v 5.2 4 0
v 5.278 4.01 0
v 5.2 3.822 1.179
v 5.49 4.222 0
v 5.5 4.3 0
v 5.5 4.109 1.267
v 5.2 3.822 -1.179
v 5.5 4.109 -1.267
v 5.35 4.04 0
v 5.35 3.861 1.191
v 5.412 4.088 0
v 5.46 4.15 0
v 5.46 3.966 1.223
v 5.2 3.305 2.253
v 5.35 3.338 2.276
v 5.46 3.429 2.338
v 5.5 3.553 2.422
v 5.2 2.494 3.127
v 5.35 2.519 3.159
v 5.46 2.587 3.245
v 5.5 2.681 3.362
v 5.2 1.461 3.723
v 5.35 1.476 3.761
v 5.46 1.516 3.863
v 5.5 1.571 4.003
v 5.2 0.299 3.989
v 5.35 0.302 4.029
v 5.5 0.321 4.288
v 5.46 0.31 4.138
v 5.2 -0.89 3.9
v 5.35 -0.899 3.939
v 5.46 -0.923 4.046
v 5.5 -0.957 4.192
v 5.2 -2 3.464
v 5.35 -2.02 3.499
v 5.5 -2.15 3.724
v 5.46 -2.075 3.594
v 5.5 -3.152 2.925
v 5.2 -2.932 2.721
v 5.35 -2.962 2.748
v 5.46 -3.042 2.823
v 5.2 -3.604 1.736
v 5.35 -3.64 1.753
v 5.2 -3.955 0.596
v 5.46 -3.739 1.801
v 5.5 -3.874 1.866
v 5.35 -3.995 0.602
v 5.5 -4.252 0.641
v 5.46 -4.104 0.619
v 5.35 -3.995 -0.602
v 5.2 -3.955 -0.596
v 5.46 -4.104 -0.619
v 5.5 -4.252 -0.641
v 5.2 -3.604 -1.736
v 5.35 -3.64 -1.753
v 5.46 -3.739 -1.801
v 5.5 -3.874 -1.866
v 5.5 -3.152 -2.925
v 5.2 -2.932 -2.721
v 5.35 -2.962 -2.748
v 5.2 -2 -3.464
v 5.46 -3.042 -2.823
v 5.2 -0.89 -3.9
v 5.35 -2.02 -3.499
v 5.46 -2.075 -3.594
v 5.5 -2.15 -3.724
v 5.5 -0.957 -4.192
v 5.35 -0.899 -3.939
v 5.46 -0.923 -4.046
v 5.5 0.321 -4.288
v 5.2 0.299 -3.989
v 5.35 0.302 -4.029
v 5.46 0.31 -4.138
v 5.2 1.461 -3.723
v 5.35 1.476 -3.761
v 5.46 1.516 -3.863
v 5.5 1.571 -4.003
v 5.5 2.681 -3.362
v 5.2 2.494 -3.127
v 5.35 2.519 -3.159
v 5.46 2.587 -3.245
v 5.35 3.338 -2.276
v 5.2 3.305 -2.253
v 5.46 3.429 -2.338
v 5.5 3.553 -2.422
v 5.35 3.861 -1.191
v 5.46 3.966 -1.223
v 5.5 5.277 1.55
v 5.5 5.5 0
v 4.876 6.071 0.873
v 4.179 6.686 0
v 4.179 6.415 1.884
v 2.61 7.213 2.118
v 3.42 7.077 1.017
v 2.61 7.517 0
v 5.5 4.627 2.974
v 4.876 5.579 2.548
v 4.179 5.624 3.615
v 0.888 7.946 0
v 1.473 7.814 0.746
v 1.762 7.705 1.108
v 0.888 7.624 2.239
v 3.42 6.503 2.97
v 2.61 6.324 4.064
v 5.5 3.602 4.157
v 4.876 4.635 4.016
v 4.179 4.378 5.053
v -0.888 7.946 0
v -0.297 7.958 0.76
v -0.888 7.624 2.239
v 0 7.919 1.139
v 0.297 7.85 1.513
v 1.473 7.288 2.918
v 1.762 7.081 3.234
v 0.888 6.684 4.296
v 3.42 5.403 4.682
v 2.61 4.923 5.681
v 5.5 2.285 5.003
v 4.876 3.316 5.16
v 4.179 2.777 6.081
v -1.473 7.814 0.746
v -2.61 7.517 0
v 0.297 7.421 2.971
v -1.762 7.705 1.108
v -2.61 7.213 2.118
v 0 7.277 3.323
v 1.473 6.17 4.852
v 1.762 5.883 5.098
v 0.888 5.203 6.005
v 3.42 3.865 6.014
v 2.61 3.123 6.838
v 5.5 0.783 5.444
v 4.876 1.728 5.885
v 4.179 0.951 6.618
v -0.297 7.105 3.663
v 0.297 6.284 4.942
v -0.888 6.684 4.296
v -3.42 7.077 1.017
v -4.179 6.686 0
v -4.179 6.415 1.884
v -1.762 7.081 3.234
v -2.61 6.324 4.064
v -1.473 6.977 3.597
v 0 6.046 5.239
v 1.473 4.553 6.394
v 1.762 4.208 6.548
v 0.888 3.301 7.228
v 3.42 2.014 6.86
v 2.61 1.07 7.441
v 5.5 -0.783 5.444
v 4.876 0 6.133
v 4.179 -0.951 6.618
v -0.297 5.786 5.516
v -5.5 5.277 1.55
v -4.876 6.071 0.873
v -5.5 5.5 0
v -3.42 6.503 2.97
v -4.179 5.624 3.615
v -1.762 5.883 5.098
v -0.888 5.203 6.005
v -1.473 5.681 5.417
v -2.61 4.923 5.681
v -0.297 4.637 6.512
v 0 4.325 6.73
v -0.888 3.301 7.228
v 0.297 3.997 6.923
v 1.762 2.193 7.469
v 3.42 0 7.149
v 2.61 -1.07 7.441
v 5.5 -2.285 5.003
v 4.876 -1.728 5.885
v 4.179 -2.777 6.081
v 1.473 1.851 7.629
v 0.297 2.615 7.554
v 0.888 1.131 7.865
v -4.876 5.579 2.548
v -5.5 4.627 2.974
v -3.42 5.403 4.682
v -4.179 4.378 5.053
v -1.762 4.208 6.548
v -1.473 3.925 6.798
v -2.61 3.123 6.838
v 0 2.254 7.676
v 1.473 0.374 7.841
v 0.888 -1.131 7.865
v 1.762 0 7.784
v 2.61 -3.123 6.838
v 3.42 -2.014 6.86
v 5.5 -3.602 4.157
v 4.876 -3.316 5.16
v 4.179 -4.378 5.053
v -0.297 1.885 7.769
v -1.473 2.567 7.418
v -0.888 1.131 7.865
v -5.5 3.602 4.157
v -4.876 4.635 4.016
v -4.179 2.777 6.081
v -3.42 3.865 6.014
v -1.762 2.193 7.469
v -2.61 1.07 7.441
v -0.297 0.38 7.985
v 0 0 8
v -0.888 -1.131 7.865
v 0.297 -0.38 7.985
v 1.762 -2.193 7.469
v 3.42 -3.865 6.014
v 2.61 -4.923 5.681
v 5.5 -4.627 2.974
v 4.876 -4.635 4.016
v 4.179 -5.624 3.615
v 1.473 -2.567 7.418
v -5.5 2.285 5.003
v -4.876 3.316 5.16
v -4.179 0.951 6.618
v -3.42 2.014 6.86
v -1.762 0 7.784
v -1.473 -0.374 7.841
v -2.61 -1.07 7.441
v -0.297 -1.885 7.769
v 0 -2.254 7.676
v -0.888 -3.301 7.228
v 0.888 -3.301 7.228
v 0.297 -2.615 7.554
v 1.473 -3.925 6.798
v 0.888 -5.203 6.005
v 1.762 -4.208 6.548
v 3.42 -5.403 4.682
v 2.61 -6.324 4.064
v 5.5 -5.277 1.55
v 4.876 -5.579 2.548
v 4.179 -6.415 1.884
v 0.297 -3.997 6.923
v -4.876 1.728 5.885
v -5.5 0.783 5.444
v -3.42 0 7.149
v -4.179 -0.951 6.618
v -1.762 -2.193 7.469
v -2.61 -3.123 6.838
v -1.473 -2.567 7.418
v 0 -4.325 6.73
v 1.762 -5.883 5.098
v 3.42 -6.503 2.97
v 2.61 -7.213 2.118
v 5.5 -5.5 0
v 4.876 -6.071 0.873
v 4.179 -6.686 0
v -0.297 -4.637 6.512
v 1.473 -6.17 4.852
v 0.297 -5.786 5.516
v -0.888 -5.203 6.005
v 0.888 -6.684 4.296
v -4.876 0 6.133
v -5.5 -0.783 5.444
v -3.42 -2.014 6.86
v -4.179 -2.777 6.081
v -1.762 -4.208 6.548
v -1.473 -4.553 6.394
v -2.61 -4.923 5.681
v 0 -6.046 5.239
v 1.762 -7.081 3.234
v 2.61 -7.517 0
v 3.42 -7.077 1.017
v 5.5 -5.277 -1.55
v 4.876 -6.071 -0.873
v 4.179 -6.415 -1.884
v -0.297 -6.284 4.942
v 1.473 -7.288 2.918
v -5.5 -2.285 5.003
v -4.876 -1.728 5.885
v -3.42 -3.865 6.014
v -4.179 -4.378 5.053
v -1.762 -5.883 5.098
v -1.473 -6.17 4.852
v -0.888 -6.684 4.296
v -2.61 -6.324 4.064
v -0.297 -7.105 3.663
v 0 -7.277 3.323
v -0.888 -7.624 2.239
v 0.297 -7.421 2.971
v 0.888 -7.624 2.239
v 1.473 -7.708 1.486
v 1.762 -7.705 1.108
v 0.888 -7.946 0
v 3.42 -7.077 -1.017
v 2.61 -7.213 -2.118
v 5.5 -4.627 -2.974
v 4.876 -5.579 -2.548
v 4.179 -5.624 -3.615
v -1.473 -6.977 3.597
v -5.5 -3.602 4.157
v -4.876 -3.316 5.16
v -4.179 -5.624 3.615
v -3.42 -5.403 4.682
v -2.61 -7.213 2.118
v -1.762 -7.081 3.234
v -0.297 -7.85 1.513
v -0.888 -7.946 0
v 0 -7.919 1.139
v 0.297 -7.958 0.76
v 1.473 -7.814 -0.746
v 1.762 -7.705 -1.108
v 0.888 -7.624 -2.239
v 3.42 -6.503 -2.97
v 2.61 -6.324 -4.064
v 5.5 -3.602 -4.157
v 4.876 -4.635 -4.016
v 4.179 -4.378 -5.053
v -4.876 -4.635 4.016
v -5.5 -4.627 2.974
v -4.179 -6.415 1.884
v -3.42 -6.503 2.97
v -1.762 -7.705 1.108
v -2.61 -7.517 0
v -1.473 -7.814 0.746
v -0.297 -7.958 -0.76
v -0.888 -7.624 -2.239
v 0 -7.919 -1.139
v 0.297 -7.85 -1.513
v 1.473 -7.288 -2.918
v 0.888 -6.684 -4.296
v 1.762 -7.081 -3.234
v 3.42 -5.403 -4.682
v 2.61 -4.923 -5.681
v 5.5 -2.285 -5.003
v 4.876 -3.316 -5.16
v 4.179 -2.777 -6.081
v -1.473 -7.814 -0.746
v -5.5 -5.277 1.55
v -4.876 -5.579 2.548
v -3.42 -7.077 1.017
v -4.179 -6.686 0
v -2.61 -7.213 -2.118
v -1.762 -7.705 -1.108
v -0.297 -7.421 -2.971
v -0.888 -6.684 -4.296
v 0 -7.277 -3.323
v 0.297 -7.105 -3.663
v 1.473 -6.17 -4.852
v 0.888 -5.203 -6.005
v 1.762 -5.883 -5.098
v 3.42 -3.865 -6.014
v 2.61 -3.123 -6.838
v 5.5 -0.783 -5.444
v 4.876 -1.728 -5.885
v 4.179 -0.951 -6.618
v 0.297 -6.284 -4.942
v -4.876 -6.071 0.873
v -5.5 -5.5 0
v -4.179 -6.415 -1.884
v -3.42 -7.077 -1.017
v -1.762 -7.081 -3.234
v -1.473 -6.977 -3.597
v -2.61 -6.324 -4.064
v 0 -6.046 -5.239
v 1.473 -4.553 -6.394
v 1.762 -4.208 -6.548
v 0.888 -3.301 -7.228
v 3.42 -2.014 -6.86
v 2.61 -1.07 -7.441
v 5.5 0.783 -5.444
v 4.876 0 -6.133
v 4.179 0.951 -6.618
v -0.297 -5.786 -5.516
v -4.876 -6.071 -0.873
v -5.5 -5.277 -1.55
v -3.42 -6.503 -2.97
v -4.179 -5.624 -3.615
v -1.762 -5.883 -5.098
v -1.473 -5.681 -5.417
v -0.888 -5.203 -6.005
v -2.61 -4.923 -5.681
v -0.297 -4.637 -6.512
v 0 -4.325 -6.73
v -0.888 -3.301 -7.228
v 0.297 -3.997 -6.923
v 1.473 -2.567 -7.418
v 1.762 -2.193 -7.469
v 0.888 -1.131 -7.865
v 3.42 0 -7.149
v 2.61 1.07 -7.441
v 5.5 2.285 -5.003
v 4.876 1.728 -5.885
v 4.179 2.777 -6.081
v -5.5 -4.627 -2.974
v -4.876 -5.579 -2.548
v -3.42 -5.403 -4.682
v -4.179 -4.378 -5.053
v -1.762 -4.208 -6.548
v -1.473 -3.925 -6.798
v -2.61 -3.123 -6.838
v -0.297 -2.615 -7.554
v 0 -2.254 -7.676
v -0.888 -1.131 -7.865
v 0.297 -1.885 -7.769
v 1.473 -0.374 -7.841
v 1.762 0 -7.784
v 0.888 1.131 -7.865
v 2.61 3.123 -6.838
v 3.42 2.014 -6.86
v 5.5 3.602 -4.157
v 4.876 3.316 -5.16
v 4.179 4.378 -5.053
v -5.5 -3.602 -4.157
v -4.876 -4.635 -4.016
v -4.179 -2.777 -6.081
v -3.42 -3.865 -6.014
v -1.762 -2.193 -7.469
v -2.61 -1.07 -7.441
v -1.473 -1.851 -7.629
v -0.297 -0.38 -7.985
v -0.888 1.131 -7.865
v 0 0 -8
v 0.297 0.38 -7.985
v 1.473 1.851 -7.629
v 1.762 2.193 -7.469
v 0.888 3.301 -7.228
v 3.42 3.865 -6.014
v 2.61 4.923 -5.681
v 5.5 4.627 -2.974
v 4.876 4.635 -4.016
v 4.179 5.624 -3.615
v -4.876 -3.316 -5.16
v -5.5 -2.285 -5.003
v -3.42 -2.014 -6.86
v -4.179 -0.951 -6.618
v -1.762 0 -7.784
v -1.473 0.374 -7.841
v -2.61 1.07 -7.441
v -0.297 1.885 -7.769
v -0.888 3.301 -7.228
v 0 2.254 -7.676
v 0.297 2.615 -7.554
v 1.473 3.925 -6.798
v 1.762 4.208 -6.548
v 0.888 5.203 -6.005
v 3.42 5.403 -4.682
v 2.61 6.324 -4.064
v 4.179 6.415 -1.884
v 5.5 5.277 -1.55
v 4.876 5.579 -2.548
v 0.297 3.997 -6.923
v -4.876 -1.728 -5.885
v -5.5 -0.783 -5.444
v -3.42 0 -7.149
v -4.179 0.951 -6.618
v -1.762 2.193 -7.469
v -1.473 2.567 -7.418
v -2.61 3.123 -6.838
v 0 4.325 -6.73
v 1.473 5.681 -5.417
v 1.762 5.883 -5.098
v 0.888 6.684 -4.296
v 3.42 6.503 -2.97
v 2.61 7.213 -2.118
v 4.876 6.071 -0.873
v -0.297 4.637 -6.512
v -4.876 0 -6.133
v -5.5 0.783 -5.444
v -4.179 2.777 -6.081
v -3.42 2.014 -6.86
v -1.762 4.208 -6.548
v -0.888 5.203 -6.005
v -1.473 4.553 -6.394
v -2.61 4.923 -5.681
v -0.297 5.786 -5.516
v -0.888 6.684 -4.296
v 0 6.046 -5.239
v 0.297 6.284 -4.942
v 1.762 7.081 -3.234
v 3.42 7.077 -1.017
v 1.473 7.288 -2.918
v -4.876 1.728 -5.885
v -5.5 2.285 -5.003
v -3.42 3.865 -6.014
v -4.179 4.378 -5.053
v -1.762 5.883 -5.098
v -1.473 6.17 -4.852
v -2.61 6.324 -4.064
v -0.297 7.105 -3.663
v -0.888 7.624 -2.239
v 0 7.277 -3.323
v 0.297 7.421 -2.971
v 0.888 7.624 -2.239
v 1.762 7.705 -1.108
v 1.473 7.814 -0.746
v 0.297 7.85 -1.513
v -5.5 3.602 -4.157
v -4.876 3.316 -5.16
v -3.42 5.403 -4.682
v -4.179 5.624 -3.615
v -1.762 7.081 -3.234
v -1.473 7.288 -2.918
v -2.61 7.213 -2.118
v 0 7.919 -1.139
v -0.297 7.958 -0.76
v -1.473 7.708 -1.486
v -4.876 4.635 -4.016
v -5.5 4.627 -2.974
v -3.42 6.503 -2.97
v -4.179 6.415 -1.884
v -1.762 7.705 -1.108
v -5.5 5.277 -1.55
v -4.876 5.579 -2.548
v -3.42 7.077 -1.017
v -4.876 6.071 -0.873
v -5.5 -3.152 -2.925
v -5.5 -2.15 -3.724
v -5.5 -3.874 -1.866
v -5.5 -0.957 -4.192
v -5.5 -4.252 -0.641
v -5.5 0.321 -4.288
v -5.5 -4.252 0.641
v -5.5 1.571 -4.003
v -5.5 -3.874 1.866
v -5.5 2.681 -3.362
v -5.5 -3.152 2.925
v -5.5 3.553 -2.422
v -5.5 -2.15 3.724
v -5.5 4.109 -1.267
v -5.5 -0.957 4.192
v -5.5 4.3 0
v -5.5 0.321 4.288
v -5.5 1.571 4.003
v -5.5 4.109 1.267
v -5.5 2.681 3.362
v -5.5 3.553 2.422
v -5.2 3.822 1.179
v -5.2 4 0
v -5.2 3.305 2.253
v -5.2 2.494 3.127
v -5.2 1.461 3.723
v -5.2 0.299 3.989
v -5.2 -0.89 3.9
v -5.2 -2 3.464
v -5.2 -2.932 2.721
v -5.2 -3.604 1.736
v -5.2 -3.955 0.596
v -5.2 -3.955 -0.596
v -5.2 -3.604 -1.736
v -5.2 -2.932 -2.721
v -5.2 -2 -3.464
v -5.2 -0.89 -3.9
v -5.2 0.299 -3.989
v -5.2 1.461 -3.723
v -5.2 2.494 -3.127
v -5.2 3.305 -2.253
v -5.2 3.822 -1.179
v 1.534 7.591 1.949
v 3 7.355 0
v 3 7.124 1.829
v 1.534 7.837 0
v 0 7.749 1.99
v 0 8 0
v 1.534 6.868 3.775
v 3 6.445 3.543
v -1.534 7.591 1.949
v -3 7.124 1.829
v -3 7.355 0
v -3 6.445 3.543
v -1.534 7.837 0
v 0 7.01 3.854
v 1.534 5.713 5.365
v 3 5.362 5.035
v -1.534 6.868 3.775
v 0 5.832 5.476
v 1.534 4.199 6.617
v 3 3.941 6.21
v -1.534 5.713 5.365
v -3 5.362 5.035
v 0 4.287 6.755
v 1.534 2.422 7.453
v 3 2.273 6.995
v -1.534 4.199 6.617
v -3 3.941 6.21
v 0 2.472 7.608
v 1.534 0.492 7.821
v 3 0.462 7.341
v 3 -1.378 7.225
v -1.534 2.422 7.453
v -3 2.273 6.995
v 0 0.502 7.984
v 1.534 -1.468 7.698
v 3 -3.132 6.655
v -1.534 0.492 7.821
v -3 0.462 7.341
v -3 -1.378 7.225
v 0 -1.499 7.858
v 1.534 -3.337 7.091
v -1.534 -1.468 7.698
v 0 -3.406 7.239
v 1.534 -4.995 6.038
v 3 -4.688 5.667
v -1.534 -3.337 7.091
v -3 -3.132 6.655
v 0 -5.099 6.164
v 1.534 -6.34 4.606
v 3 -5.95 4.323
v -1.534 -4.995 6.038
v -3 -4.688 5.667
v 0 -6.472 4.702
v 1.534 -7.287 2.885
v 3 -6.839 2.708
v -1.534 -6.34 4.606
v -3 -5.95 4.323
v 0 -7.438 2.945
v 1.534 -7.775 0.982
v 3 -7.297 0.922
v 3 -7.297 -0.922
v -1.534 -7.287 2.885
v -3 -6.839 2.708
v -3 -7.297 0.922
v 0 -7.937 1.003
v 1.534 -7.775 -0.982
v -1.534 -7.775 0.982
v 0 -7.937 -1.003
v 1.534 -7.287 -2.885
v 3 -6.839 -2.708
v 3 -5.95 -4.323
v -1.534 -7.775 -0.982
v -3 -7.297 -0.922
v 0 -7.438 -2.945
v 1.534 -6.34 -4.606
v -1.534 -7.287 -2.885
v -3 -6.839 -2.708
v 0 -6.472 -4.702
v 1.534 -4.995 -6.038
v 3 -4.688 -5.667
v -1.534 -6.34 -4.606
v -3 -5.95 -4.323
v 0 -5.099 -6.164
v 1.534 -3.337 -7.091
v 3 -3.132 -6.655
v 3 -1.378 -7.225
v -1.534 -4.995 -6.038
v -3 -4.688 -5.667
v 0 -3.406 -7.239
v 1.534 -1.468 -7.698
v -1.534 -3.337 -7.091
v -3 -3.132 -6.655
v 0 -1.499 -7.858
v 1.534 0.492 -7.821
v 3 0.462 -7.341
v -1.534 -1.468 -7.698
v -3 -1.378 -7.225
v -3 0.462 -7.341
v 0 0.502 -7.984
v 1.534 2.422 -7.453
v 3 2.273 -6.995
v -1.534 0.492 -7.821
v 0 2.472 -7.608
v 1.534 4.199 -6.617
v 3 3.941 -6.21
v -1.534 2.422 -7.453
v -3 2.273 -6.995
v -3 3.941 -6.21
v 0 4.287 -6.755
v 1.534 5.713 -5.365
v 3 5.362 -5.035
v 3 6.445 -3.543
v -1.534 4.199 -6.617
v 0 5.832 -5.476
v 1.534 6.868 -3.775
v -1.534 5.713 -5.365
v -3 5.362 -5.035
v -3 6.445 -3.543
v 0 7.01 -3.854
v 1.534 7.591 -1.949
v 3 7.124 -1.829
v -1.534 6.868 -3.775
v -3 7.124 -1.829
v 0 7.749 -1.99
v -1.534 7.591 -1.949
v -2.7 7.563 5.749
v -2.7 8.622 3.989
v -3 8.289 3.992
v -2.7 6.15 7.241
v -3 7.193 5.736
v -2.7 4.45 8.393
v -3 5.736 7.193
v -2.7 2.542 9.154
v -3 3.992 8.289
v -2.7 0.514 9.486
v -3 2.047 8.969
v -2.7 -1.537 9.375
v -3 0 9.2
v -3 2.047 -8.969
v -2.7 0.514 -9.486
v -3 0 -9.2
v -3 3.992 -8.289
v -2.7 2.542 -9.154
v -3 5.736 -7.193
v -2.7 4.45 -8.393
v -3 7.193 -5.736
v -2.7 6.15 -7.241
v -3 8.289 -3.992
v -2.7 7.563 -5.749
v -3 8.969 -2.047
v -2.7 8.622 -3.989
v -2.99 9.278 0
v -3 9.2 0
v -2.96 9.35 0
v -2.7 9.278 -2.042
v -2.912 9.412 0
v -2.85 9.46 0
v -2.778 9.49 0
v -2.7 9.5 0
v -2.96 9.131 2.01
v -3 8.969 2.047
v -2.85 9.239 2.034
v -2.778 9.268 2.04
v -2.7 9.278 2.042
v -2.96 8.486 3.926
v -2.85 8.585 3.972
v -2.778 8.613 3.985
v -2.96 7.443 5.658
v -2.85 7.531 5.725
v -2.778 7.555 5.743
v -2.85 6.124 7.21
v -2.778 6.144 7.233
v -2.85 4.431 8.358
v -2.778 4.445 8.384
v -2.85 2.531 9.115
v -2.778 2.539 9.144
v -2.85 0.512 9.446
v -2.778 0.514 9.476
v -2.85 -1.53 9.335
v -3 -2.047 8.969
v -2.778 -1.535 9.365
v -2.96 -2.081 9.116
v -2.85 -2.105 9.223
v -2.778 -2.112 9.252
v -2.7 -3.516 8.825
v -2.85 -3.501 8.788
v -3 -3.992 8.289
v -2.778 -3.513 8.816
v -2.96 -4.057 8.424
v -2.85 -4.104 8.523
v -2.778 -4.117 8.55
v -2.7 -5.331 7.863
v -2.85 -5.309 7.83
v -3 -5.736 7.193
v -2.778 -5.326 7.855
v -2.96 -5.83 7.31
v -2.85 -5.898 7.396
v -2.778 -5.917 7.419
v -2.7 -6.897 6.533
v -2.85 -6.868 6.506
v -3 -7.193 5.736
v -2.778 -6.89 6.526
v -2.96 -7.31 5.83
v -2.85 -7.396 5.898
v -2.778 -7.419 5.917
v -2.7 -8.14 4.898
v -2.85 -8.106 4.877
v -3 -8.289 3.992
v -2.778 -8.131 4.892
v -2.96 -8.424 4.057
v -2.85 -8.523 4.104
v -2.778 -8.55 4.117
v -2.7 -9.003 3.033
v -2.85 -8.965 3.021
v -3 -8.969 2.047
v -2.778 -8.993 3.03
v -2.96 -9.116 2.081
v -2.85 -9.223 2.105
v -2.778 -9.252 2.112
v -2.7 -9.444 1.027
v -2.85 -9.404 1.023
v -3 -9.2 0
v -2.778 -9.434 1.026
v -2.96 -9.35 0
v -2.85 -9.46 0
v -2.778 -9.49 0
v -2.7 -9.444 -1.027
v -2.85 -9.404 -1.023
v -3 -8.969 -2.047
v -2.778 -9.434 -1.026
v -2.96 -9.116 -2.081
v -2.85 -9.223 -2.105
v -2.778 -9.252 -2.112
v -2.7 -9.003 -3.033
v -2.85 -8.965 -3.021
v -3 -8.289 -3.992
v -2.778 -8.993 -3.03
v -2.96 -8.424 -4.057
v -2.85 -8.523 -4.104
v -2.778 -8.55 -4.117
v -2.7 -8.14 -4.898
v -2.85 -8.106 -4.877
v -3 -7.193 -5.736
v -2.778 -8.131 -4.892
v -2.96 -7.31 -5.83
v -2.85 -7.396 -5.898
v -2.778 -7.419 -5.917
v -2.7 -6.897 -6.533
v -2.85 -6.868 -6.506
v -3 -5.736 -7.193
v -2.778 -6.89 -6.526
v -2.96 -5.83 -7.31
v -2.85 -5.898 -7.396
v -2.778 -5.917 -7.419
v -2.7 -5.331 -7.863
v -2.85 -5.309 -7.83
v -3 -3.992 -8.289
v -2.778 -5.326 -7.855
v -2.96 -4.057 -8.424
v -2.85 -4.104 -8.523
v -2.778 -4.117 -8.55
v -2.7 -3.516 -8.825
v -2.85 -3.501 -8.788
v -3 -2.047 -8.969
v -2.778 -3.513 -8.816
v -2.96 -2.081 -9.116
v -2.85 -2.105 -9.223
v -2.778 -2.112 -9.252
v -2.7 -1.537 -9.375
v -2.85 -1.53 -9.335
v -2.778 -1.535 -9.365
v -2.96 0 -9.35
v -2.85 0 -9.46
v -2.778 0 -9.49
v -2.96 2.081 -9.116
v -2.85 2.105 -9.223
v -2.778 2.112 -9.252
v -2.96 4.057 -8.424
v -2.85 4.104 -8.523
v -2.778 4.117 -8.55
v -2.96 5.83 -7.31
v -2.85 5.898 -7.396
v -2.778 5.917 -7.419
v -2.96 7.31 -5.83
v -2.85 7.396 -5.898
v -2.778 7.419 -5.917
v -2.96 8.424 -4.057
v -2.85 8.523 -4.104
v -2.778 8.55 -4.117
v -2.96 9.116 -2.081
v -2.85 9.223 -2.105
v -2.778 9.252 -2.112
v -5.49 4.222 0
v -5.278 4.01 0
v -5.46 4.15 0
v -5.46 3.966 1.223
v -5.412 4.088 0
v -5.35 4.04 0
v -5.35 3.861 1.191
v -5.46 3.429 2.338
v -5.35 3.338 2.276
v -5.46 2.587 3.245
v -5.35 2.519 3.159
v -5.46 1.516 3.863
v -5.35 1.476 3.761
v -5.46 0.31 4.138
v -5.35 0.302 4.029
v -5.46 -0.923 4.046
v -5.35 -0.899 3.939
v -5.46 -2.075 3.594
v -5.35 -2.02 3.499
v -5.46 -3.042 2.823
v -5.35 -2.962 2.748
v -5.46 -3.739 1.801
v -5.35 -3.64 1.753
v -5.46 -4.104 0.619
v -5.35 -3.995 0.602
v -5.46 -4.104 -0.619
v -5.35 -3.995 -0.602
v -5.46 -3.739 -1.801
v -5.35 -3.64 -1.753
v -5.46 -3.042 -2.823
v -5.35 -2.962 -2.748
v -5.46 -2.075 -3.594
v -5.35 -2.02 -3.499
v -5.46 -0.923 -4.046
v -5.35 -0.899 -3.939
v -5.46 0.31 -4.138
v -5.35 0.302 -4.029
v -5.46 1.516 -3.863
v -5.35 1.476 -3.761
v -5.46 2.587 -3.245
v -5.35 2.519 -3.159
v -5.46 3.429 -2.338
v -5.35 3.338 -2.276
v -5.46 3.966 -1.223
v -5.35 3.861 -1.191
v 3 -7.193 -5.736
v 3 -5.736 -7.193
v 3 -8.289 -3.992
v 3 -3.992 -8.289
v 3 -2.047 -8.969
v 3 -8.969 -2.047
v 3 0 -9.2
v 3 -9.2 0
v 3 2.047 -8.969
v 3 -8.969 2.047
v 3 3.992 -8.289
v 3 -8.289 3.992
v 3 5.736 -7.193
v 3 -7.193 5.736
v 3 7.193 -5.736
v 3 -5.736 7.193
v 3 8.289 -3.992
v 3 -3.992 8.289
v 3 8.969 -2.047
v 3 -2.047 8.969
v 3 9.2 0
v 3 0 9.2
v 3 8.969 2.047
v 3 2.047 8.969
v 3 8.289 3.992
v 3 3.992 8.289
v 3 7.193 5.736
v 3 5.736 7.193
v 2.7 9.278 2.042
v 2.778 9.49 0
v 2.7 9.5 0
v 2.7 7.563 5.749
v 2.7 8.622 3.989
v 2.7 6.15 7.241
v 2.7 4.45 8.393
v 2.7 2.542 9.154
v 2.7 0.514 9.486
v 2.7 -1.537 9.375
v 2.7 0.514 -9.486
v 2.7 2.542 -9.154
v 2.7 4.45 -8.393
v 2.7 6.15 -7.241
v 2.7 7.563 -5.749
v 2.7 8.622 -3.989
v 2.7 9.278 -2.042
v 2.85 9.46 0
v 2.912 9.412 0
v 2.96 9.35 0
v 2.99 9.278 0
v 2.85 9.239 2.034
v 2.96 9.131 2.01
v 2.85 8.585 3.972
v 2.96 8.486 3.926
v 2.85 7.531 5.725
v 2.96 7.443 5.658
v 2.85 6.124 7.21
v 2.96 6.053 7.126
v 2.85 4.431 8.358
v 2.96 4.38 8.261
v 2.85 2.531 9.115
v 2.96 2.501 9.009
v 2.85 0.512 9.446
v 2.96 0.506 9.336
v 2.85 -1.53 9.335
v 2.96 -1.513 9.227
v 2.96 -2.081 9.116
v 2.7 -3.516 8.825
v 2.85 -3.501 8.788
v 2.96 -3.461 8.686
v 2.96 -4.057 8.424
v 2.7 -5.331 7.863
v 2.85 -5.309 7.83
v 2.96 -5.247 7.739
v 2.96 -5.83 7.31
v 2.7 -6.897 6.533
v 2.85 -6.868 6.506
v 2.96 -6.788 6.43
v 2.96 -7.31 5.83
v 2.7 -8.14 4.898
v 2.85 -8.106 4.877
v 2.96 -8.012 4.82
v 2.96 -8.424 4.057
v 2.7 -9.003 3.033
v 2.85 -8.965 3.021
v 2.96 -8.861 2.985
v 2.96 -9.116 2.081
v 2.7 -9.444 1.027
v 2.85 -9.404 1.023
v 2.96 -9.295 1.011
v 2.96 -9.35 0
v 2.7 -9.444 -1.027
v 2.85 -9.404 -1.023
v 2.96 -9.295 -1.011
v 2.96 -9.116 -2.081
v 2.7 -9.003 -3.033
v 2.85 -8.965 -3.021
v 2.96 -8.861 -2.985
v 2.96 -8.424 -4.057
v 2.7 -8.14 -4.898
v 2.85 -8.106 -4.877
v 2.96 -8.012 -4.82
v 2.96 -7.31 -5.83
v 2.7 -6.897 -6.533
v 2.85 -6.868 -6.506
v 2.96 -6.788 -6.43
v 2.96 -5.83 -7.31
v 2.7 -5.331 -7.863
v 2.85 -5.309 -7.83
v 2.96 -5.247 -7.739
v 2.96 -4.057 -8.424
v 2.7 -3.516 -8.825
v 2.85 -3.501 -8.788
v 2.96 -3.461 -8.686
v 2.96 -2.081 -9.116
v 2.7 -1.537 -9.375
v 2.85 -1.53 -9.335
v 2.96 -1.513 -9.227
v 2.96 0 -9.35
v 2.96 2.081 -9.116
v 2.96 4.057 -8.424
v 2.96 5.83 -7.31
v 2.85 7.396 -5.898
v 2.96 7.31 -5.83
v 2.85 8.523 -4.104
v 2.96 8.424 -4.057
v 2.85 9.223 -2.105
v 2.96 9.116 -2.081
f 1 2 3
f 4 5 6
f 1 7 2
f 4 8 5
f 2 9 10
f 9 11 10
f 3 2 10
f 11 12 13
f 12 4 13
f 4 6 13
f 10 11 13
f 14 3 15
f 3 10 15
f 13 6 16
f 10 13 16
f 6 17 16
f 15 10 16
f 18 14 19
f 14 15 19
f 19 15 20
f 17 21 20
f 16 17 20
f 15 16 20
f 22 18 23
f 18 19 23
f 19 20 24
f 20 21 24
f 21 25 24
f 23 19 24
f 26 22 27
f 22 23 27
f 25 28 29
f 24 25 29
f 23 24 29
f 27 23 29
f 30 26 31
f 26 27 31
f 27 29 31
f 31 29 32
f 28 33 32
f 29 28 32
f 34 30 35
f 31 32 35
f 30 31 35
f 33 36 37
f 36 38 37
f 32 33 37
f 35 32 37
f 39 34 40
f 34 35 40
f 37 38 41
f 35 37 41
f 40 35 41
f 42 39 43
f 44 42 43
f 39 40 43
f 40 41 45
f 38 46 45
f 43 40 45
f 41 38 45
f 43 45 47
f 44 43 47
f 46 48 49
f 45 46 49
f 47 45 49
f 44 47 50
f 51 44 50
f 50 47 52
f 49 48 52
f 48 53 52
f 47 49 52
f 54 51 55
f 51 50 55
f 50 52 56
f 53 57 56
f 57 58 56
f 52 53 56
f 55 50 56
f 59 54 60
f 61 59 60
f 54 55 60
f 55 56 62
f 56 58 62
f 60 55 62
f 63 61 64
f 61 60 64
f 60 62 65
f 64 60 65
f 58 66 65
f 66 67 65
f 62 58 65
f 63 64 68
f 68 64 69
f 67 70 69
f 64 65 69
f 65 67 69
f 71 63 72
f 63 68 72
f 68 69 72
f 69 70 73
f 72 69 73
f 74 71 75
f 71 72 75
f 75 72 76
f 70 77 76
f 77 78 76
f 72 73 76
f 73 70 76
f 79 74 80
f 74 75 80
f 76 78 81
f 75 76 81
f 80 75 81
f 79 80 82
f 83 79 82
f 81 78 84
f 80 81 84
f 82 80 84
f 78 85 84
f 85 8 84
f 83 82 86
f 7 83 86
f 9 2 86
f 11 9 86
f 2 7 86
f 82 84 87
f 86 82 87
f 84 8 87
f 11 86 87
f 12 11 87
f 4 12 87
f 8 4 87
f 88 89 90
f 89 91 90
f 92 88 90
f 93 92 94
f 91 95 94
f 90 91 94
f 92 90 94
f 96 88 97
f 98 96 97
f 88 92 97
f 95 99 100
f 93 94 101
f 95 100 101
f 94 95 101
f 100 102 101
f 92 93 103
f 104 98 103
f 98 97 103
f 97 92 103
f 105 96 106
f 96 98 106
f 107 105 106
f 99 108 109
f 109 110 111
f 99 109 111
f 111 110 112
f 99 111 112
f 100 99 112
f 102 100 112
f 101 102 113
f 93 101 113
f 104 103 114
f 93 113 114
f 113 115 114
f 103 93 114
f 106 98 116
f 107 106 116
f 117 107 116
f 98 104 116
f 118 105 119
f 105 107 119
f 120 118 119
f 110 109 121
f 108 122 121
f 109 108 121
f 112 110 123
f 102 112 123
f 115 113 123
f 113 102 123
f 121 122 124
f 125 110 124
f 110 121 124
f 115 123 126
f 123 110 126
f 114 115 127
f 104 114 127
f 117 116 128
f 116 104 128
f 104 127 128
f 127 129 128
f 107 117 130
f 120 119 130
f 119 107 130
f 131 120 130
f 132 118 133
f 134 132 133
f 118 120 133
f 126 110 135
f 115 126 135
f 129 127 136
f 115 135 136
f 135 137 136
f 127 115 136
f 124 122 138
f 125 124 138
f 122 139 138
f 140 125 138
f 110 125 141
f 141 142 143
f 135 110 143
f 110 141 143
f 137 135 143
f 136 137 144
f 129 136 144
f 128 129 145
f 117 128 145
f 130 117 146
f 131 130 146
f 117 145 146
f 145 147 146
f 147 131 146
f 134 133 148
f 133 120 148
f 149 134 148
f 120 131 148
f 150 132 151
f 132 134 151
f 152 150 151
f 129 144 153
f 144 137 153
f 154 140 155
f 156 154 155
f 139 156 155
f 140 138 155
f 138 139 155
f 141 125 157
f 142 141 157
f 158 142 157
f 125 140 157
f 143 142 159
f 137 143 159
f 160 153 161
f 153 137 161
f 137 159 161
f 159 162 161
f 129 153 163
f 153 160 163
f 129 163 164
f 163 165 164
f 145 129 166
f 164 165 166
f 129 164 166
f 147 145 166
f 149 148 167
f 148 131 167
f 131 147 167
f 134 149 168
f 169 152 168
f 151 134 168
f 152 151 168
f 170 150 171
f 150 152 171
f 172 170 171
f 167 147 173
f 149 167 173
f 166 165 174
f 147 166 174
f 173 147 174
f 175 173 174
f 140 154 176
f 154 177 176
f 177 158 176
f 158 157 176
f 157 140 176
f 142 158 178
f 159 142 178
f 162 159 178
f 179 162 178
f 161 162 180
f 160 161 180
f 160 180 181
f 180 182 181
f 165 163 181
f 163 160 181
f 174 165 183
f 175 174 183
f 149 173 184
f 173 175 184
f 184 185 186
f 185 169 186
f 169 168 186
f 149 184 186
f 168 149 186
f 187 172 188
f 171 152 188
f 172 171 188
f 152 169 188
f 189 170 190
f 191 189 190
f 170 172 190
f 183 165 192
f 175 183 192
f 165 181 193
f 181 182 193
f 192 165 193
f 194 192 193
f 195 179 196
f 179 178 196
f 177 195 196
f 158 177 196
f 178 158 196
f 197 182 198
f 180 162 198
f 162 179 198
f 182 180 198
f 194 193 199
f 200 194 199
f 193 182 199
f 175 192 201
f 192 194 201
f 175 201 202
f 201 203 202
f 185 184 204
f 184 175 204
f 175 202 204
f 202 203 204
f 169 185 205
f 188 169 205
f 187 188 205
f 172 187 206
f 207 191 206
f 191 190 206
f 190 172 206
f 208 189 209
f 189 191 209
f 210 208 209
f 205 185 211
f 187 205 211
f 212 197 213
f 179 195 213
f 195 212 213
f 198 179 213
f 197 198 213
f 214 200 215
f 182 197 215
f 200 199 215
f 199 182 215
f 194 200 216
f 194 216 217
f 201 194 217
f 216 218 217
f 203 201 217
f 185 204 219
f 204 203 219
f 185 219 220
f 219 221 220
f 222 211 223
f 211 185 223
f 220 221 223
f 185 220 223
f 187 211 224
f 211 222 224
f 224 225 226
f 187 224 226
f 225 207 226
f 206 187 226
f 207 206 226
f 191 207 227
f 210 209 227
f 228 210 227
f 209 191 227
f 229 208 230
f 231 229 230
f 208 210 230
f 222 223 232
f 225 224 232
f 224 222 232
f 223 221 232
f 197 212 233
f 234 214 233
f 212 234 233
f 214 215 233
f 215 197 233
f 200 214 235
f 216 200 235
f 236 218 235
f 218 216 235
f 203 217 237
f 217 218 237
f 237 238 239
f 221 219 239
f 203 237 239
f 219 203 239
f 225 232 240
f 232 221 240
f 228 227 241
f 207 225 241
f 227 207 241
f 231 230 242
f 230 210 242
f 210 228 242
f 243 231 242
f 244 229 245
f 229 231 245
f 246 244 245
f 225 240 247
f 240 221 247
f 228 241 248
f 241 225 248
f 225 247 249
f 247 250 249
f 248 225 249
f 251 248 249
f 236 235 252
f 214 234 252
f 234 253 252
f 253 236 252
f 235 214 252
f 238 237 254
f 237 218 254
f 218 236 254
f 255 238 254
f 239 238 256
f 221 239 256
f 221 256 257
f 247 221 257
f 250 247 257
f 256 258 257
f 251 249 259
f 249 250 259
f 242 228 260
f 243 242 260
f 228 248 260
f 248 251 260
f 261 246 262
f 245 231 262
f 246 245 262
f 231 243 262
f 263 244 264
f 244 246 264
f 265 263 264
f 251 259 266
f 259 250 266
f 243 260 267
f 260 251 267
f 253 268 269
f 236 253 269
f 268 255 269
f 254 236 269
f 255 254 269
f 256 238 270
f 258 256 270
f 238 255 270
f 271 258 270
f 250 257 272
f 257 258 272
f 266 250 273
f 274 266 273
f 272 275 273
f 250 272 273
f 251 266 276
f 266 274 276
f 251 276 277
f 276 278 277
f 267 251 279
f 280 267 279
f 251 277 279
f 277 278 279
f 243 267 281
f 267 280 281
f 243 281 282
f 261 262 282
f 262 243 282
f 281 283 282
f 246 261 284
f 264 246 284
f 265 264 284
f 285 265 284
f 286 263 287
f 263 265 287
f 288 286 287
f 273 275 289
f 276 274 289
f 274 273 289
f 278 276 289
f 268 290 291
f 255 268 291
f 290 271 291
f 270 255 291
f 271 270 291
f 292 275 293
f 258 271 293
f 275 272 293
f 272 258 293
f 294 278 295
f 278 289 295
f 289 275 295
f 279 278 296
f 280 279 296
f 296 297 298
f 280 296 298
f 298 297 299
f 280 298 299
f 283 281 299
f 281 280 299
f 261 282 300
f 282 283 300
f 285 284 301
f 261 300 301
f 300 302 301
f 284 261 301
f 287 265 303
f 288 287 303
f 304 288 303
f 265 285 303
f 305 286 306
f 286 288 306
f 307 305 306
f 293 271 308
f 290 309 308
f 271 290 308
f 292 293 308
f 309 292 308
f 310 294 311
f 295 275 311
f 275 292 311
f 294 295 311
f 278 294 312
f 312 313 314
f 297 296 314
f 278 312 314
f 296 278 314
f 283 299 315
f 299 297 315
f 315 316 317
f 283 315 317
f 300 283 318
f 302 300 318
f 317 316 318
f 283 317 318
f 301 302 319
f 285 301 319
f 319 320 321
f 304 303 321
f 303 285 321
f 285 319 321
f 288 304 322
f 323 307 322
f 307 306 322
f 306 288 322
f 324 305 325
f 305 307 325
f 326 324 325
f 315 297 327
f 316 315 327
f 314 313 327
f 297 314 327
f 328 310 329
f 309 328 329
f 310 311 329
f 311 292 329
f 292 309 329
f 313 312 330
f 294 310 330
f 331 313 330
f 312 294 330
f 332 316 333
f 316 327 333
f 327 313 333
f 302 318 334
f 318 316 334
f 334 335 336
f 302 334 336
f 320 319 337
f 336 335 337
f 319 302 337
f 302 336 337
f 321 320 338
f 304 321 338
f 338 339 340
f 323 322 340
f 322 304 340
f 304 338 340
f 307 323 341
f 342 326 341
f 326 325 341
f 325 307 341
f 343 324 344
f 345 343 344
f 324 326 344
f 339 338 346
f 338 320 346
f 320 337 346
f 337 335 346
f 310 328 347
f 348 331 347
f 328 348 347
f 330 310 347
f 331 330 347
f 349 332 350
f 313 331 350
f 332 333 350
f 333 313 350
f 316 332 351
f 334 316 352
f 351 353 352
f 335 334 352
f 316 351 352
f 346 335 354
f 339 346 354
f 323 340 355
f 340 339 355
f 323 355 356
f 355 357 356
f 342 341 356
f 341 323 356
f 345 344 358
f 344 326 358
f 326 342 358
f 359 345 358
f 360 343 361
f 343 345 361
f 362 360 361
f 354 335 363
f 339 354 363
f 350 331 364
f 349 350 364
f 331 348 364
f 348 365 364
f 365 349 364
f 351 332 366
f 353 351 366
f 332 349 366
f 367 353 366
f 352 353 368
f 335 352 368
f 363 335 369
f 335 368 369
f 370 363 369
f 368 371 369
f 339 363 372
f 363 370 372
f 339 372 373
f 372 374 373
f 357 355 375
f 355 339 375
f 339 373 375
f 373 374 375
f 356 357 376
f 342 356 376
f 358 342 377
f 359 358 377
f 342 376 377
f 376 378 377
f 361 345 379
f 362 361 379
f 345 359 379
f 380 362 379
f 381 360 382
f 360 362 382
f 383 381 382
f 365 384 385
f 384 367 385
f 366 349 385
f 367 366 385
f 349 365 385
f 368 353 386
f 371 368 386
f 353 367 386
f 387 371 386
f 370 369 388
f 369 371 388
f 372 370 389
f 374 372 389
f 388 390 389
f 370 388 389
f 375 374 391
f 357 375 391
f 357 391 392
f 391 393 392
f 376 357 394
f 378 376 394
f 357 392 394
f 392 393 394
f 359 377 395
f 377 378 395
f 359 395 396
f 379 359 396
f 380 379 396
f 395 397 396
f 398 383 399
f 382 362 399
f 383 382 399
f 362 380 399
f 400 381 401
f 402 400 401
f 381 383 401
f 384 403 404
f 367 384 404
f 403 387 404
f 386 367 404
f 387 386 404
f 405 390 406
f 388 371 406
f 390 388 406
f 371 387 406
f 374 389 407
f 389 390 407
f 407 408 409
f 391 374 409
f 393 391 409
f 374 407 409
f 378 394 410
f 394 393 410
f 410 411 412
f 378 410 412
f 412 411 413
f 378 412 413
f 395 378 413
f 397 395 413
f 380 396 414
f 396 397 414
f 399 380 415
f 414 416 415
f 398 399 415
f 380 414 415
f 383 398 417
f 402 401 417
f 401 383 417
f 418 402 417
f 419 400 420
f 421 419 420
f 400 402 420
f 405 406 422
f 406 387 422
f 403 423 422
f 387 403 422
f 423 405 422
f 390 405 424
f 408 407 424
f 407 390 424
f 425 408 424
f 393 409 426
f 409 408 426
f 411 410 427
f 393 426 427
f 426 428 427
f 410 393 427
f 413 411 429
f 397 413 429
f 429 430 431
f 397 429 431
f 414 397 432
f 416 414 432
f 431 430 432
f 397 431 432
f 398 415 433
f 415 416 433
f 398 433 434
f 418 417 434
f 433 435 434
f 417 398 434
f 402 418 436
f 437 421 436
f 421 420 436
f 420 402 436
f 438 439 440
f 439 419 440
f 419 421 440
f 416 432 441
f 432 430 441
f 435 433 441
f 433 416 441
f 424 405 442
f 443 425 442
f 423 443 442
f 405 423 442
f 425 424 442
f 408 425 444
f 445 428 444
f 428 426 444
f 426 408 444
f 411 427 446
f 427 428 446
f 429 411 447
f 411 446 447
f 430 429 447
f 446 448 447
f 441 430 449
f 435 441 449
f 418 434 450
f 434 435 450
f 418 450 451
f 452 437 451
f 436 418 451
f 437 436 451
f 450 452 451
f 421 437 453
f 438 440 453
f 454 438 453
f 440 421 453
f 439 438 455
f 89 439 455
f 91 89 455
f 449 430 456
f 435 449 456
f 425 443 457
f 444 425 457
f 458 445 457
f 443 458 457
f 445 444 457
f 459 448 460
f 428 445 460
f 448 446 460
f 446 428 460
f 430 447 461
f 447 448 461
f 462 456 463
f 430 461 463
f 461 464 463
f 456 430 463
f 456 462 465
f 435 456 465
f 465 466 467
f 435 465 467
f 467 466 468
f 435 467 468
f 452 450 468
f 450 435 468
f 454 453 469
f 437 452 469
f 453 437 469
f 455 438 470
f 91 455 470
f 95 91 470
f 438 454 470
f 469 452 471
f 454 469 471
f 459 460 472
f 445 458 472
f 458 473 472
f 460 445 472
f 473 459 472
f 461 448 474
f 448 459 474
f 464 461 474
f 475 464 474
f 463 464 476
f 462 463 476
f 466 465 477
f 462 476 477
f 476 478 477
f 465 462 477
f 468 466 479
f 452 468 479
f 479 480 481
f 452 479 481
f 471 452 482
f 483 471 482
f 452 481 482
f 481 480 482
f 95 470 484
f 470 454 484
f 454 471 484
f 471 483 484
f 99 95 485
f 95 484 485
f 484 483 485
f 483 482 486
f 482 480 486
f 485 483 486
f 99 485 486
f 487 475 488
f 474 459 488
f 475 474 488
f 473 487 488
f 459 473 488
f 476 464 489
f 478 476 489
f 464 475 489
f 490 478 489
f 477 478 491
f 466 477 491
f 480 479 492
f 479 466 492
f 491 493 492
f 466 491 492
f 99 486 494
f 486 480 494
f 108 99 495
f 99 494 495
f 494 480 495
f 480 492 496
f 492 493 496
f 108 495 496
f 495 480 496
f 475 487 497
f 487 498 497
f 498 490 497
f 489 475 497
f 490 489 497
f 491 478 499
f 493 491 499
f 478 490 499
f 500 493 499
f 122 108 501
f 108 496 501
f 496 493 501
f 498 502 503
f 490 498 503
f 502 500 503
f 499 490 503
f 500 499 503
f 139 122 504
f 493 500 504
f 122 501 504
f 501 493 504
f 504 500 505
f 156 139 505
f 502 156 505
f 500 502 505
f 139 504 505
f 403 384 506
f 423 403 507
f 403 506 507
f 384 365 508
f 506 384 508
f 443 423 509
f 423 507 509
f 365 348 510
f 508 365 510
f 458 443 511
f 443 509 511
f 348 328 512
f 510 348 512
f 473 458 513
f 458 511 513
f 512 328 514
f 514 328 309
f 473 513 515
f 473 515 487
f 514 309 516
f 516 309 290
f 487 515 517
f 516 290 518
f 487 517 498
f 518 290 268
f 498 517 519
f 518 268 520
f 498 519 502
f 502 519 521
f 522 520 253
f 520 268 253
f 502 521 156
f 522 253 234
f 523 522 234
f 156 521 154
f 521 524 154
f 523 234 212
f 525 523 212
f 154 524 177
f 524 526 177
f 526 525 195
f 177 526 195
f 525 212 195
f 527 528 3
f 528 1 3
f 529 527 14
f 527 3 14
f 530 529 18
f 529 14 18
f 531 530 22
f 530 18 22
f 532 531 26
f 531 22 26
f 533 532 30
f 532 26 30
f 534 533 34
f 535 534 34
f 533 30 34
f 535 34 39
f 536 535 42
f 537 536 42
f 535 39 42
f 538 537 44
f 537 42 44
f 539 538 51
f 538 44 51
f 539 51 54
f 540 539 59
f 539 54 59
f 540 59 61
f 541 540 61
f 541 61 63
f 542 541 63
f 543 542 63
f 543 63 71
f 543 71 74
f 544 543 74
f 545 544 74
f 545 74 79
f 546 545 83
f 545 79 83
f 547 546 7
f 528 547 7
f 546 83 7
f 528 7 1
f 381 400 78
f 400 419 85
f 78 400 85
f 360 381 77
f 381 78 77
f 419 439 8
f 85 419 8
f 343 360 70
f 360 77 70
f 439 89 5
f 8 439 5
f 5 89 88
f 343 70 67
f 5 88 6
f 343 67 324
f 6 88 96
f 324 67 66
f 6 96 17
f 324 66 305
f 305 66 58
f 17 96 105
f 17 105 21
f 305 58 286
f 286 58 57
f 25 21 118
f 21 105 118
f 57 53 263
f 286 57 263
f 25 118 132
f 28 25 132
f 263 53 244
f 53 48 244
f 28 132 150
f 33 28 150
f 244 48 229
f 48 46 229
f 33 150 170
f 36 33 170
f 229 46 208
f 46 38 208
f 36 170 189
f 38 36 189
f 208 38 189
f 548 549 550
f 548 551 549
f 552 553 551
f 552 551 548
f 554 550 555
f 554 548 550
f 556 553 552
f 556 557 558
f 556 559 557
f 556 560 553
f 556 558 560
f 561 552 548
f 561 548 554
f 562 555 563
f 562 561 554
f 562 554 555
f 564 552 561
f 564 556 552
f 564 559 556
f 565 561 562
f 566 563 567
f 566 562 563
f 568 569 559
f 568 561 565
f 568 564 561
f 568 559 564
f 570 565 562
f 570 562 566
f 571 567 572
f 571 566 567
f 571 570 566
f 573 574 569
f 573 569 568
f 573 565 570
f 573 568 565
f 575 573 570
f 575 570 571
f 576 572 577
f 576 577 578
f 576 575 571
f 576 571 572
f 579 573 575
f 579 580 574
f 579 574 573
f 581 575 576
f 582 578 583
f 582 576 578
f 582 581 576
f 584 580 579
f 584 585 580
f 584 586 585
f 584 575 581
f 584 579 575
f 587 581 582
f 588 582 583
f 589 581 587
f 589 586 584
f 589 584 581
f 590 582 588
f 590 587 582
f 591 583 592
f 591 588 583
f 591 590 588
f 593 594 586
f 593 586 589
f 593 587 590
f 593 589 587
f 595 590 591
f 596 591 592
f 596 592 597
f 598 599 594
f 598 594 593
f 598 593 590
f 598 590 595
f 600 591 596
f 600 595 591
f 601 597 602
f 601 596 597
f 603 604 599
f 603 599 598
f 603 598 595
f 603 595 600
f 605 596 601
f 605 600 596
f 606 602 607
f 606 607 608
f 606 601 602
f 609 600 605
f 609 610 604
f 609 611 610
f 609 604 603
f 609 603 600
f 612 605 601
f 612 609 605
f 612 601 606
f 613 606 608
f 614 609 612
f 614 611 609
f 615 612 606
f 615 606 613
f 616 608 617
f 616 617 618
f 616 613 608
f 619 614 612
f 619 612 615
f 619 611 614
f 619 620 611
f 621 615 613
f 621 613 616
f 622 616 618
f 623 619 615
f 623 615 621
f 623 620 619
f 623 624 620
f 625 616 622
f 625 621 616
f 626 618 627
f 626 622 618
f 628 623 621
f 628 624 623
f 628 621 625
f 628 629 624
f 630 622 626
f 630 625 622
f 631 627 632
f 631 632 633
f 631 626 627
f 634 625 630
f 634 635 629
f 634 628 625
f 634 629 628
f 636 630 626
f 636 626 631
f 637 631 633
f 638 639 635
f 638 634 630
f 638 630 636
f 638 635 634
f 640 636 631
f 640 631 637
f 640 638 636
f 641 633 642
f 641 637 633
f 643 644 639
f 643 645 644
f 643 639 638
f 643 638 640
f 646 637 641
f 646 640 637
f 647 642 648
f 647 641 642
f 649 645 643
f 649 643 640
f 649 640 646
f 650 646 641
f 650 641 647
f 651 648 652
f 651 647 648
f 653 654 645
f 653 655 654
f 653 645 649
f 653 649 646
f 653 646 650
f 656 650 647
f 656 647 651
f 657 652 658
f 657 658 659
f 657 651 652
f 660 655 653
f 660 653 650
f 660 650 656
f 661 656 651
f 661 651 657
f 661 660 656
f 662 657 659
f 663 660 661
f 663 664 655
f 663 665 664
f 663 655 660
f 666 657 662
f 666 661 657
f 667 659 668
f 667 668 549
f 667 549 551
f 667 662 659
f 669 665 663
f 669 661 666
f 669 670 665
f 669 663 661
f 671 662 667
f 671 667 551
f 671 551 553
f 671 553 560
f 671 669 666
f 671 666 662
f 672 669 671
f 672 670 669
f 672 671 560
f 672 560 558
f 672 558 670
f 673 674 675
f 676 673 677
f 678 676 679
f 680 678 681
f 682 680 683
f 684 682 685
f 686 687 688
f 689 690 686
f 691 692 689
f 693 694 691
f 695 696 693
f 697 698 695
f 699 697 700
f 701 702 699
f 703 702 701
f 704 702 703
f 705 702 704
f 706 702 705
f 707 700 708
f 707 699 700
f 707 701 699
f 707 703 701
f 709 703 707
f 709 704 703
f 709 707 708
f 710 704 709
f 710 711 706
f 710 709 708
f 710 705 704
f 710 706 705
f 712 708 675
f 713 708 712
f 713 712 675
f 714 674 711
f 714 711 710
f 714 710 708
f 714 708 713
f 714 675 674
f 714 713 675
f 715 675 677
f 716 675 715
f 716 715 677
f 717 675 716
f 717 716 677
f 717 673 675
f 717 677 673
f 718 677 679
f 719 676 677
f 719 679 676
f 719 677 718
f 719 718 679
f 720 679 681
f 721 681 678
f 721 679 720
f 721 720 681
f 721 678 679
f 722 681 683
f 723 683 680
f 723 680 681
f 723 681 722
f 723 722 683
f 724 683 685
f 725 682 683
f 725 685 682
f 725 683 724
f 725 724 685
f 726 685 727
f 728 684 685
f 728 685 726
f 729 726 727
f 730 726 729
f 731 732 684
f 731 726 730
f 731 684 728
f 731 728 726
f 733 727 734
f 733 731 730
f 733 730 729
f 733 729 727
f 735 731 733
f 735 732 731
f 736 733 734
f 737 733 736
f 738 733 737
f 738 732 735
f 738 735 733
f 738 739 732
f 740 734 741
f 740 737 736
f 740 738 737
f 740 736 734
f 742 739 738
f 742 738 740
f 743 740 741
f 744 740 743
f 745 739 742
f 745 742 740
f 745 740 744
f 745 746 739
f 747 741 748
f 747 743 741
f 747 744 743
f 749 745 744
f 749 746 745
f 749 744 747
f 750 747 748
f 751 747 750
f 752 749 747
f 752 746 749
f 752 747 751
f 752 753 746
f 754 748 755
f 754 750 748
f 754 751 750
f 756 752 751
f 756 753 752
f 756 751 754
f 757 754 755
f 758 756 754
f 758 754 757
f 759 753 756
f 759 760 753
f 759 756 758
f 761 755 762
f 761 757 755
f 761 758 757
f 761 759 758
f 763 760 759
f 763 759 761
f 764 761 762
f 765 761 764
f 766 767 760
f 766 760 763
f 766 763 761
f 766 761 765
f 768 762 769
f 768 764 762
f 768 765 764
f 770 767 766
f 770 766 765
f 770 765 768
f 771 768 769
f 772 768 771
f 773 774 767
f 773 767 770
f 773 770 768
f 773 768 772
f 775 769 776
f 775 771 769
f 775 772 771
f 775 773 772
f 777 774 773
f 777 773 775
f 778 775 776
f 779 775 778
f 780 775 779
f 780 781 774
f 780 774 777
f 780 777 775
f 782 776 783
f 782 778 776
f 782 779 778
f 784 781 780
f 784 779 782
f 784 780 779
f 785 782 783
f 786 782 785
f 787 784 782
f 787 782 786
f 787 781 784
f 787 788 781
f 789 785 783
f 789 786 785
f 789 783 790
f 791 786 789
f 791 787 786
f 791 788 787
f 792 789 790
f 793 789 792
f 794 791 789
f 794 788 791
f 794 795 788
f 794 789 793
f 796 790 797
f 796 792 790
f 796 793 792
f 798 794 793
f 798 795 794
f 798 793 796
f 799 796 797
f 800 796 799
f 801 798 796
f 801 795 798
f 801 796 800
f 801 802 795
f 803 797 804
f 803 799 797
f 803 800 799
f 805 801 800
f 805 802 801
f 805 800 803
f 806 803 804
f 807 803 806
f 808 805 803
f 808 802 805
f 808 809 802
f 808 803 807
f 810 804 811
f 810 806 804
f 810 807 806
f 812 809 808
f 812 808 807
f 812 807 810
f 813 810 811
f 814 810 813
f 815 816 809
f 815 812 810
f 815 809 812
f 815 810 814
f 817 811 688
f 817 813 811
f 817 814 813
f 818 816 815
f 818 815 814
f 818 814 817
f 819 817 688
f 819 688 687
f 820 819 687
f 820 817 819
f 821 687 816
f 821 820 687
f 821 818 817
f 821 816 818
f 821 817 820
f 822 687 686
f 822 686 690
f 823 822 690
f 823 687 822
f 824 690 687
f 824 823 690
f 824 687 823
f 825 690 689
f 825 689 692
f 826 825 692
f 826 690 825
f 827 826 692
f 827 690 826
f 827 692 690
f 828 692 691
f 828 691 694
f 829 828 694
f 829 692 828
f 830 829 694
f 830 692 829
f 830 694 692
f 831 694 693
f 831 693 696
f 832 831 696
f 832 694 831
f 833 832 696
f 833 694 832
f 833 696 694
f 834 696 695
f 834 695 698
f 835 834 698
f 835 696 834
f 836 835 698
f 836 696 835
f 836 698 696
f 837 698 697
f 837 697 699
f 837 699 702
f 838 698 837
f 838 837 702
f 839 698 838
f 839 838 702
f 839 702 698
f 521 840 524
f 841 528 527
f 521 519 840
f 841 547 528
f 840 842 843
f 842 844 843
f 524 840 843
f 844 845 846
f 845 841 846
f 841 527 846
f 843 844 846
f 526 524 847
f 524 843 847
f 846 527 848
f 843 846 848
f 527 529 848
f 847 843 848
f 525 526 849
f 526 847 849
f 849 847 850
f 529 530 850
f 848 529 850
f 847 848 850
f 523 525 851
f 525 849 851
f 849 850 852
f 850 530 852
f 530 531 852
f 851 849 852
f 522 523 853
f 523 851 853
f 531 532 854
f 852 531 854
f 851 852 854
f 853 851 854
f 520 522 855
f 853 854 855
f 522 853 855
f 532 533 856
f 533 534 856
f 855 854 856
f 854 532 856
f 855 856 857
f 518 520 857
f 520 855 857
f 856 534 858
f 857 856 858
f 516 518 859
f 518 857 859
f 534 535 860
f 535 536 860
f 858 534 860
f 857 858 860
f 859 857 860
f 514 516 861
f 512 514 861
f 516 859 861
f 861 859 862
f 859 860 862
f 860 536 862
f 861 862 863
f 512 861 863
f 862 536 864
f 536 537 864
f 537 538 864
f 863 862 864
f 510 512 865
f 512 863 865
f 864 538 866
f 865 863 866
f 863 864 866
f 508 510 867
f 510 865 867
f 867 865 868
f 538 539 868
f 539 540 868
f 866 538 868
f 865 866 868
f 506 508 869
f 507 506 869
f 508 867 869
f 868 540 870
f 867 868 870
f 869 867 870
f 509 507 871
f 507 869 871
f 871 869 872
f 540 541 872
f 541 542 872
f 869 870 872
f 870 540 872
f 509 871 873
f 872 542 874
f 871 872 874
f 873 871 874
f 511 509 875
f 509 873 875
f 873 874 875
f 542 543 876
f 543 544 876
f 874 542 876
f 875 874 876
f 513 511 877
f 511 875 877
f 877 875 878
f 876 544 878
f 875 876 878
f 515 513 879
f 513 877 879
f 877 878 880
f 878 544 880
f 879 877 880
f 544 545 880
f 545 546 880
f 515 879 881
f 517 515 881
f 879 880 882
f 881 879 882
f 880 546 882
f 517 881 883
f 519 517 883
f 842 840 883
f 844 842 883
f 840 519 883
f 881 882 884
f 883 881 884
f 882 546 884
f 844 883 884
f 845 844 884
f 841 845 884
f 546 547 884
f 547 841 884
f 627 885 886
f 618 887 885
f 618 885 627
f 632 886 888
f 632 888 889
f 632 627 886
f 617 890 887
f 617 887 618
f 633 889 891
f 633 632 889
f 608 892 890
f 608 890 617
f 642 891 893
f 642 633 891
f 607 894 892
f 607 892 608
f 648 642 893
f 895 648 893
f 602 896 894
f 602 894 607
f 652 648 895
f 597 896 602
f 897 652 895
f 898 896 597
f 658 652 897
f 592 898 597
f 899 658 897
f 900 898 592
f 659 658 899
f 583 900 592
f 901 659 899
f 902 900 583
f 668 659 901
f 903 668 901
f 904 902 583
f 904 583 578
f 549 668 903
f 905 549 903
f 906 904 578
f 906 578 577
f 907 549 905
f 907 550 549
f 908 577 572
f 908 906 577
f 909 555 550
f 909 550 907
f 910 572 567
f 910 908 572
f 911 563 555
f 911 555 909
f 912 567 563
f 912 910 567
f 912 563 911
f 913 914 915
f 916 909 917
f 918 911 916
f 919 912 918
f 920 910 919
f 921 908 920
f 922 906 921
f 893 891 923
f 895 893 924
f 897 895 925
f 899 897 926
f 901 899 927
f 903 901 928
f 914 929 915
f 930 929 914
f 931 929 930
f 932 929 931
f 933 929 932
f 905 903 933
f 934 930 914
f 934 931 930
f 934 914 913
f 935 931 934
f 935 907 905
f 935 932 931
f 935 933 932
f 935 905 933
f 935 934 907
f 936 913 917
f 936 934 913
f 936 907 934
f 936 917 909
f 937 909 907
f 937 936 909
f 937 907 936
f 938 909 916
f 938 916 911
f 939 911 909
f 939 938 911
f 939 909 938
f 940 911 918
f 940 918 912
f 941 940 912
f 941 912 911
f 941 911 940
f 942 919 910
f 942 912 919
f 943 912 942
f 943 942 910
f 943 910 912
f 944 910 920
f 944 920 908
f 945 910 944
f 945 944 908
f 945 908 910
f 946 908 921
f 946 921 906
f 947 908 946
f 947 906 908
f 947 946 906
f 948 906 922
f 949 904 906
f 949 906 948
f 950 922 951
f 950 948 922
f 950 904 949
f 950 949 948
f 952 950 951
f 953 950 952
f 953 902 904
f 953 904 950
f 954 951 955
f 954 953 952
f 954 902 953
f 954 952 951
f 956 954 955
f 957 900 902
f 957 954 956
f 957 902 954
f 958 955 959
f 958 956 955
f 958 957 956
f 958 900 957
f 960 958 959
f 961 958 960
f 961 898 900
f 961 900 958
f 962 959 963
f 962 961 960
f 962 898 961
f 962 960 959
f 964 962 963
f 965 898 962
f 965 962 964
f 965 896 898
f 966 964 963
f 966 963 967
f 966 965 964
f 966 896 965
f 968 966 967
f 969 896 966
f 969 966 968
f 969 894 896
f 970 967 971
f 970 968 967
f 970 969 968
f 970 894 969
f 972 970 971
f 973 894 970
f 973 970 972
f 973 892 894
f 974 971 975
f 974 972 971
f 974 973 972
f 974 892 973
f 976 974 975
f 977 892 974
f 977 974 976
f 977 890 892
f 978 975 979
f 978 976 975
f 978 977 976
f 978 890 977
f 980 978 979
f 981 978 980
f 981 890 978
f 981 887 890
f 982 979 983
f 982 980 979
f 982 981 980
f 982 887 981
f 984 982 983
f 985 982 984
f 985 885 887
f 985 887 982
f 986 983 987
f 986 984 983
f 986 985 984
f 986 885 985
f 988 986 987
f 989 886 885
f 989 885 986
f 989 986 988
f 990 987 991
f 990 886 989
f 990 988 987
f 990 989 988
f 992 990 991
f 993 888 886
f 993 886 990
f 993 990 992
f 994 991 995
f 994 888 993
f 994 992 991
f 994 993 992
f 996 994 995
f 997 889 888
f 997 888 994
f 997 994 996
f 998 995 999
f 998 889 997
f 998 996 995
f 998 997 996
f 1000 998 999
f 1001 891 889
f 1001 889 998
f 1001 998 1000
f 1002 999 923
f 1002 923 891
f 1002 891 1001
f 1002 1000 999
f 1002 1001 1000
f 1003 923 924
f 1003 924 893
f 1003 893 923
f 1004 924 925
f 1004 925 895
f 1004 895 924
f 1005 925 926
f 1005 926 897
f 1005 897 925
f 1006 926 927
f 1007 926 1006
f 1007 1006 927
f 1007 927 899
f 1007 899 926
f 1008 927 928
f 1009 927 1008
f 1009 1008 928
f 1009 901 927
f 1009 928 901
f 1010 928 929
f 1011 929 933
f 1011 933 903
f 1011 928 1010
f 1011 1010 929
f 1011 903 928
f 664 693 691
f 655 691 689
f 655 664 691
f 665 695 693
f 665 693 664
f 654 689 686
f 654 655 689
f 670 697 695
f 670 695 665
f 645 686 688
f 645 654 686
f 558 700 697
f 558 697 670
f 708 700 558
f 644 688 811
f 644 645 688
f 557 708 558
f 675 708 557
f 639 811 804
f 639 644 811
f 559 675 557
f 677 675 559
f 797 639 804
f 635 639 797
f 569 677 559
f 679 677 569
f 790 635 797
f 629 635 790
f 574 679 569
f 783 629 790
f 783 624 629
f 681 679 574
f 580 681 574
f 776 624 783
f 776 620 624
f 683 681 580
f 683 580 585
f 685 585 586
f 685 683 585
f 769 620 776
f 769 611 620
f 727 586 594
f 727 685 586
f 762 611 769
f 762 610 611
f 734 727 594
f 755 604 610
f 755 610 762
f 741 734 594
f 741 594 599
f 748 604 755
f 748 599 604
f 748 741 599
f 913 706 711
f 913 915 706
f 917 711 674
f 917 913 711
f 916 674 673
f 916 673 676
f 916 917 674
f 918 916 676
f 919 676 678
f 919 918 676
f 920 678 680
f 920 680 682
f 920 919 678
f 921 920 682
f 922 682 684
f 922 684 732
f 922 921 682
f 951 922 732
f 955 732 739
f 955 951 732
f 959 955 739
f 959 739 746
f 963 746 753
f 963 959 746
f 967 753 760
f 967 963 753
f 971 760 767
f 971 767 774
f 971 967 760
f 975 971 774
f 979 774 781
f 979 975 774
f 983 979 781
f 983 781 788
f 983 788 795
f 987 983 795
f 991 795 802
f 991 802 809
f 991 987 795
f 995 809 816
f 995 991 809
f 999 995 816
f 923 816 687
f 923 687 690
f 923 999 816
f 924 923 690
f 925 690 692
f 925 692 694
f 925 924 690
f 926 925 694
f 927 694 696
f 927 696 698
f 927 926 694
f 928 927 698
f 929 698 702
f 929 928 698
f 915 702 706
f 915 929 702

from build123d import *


with BuildPart() as part:
    # 草图2 → 旋转1 (revolve)
    with BuildSketch(Plane.XY):
        with BuildLine():
            Line((-3, 7.355073253), (-3, 9.2))
            ThreePointArc((-3, 9.2), (-2.912132034, 9.412132034), (-2.7, 9.5))
            Line((-2.7, 9.5), (2.7, 9.5))
            ThreePointArc((2.7, 9.5), (2.912132034, 9.412132034), (3, 9.2))
            Line((3, 9.2), (3, 7.355073253))
            ThreePointArc((3, 7.355073253), (0, 8), (-3, 7.355073253))
        make_face()
    revolve(axis=Axis((-7, 0, 0), (1, 0, 0)))


with BuildPart() as body_2:
    # 草图3 → 旋转2 (revolve)
    with BuildSketch(Plane.XY):
        with BuildLine():
            Line((-5.5, 5.5), (-5.5, 4.3))
            ThreePointArc((-5.5, 4.3), (-5.412132034, 4.087867966), (-5.2, 4))
            Line((-5.2, 4), (5.2, 4))
            ThreePointArc((5.2, 4), (5.412132034, 4.087867966), (5.5, 4.3))
            Line((5.5, 4.3), (5.5, 5.5))
            ThreePointArc((5.5, 5.5), (0, 8), (-5.5, 5.5))
        make_face()
    revolve(axis=Axis((-7, 0, 0), (1, 0, 0)))


solid = Compound([part.part, body_2.part])
